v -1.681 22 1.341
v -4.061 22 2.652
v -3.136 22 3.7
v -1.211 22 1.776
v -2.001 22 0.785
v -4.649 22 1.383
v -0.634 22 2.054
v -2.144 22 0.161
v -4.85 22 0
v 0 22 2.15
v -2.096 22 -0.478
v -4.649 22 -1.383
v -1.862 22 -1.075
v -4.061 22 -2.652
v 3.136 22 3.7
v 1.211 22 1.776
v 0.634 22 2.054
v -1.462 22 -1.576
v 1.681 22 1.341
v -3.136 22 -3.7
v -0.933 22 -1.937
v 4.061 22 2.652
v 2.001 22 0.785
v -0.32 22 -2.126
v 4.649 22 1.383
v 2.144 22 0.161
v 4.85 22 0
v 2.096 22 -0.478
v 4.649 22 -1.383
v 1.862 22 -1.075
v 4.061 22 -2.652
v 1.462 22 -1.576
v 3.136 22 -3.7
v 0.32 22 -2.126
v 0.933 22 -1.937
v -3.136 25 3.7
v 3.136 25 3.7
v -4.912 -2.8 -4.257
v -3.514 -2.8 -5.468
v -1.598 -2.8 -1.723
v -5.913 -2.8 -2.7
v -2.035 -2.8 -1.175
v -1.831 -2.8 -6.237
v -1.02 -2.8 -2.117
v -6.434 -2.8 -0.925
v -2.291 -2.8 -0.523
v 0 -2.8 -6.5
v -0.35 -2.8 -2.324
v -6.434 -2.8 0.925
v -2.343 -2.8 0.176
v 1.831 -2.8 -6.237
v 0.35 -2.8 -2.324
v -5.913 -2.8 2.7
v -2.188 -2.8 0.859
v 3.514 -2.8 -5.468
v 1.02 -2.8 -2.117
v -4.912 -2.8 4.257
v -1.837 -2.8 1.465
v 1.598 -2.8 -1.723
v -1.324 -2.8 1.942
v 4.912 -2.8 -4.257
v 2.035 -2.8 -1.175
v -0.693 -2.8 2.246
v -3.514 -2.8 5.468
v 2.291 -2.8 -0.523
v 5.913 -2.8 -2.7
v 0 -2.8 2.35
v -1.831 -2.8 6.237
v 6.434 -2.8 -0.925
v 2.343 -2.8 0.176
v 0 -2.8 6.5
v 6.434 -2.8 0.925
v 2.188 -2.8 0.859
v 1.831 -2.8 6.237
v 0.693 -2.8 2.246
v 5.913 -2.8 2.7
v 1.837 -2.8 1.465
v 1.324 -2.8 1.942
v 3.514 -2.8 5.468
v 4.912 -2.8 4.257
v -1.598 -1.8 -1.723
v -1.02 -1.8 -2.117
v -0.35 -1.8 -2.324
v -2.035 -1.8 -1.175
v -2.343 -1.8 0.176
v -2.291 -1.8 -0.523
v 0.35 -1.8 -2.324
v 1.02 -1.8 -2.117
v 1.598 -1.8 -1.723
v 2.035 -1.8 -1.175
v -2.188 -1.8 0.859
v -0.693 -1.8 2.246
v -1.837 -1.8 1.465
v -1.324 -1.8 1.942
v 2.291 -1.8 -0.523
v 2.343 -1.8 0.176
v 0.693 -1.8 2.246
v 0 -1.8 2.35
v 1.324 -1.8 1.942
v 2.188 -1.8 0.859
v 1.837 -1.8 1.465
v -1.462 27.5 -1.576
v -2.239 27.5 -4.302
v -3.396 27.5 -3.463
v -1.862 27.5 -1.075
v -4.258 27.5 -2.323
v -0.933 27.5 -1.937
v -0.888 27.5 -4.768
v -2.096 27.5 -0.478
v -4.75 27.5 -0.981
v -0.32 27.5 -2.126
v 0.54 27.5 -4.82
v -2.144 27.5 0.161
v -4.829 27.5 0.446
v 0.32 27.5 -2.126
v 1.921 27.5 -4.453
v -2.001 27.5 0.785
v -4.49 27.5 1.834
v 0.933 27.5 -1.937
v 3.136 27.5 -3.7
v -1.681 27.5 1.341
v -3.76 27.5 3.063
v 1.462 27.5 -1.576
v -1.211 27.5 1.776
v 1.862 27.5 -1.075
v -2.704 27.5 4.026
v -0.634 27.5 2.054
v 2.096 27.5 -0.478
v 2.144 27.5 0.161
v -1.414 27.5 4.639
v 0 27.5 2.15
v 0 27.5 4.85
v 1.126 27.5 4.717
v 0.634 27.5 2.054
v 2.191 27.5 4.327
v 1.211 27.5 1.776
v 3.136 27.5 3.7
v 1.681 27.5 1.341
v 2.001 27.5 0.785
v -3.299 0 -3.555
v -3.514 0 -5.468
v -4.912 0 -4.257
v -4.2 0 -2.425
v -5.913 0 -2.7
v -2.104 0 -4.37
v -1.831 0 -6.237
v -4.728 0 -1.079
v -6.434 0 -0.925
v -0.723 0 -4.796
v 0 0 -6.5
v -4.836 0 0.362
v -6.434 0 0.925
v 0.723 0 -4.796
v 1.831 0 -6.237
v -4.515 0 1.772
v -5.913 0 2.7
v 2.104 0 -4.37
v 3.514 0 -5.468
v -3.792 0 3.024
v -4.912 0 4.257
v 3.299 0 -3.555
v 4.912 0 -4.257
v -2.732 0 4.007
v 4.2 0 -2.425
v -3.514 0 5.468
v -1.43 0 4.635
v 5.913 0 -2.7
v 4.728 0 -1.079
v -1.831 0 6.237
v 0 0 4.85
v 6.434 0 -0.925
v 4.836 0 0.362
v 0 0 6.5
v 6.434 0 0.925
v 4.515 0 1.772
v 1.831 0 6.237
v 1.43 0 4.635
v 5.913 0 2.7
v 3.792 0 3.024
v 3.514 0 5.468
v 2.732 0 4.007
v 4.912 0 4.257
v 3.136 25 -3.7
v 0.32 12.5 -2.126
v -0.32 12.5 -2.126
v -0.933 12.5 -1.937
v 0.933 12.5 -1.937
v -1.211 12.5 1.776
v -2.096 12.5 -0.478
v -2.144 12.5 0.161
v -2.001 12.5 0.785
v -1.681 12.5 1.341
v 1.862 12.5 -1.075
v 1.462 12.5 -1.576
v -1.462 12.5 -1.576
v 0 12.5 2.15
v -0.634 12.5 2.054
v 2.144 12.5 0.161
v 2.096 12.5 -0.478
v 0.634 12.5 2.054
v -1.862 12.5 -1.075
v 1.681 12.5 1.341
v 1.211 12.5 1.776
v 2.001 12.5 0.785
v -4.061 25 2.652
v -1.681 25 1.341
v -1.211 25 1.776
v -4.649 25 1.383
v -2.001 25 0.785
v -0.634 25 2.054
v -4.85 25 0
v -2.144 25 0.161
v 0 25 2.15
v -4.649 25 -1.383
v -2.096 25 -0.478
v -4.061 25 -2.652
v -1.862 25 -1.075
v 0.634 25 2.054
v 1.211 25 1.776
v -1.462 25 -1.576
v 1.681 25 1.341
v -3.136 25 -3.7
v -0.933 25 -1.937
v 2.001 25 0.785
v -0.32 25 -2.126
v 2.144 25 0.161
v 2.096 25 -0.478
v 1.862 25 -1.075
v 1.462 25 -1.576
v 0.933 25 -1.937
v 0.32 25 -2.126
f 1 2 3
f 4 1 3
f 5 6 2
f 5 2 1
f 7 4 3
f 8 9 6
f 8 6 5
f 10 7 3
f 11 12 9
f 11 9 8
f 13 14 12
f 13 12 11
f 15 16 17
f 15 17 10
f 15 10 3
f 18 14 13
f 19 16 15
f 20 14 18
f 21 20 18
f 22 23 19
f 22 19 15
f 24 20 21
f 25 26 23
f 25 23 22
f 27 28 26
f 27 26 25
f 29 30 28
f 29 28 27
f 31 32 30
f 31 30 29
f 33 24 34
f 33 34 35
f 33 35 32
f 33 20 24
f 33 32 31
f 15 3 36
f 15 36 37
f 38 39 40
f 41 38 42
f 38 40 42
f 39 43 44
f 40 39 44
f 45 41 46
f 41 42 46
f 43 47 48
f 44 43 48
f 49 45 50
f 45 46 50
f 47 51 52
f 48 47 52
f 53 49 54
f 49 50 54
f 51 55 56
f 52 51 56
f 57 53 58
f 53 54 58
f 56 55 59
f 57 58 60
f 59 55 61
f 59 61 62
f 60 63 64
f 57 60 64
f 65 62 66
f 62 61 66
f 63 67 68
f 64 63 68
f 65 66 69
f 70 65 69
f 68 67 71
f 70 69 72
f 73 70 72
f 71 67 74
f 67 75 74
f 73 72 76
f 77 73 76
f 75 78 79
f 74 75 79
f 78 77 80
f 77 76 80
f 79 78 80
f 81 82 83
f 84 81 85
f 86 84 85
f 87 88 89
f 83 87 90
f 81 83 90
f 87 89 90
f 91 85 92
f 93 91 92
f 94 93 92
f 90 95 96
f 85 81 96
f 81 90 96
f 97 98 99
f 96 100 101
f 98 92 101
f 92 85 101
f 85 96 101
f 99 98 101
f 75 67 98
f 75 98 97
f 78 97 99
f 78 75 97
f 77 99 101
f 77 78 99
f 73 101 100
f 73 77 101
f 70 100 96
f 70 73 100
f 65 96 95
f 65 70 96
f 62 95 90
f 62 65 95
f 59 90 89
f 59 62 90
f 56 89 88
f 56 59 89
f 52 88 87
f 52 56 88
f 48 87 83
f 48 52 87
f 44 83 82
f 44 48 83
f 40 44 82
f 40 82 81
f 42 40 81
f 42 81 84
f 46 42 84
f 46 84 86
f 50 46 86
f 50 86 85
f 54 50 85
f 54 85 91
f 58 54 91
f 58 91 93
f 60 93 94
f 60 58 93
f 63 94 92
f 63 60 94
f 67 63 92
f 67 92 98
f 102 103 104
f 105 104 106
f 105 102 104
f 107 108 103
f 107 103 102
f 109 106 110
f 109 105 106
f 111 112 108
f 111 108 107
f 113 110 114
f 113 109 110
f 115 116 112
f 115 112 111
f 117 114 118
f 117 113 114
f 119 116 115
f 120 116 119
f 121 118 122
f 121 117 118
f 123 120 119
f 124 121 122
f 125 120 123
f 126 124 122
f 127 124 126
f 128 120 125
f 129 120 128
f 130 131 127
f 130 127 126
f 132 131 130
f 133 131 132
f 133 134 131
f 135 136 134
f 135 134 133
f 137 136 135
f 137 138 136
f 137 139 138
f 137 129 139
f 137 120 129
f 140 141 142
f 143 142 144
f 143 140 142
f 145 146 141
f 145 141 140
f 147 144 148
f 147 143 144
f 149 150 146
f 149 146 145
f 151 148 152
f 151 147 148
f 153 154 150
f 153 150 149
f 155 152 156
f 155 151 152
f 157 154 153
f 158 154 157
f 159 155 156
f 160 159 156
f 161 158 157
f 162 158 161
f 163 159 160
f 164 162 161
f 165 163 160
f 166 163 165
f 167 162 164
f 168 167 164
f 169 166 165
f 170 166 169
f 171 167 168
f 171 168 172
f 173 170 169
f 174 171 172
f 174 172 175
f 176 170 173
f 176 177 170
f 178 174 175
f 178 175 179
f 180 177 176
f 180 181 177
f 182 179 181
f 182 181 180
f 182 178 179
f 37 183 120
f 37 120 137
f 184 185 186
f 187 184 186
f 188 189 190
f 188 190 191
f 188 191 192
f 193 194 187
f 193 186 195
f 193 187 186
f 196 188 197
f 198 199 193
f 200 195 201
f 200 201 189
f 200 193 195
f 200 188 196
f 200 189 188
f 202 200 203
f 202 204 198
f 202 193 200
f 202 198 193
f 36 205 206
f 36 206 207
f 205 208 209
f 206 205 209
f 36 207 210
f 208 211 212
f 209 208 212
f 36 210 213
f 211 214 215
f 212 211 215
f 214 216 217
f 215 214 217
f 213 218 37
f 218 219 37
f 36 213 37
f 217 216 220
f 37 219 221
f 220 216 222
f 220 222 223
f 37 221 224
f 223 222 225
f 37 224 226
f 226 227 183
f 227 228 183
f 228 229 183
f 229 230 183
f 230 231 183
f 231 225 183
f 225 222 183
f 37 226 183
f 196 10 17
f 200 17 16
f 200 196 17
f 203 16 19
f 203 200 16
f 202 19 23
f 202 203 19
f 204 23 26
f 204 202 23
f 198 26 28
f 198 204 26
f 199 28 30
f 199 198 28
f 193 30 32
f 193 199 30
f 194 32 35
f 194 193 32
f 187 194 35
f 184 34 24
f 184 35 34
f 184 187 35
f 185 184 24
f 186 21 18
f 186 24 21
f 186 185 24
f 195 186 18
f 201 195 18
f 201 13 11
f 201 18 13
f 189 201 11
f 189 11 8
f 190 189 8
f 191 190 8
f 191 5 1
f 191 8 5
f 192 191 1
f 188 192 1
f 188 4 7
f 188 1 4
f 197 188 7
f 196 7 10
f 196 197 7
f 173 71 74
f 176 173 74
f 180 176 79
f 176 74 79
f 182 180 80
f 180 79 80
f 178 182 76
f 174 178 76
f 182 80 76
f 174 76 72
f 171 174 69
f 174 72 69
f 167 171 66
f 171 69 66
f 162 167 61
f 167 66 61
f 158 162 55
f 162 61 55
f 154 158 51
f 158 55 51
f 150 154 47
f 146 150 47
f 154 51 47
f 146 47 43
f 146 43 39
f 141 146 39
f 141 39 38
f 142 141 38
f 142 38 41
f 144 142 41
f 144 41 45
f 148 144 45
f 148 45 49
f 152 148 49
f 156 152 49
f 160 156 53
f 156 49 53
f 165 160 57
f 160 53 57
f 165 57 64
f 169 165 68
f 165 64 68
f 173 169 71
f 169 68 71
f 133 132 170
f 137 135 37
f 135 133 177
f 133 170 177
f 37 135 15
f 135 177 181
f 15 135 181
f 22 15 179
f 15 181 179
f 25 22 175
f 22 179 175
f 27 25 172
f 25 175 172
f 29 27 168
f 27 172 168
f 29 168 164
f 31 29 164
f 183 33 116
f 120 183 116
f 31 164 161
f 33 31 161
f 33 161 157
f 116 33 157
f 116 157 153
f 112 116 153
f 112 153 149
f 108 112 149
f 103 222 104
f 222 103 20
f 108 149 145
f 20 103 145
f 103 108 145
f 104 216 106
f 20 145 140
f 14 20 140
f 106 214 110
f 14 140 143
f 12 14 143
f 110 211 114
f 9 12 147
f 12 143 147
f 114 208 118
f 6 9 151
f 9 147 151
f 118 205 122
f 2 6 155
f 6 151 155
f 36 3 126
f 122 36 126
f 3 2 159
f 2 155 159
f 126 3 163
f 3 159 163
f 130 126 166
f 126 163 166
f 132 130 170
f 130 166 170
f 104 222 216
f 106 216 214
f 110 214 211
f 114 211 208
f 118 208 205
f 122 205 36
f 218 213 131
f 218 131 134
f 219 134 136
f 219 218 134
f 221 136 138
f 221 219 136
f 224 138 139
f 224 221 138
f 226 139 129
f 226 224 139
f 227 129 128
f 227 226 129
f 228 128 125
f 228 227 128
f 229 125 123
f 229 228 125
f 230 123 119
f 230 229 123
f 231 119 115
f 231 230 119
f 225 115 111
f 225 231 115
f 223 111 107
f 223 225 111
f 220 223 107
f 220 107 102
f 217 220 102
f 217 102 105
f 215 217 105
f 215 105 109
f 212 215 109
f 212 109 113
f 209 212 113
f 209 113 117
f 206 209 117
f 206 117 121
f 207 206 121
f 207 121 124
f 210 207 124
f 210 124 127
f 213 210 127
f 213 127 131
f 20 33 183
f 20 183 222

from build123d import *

# Parameters (mm, degrees)
SKETCH1_R              = 4.85
SKETCH1_R_2            = 3
SKETCH1_R_3            = 2.15
BOSS_EXTRUDE1_DEPTH    = 27.5
BOSS_EXTRUDE2_START    = -2.8
SKETCH1_3_R            = 6.5
SKETCH1_3_R_2          = 4.85
SKETCH1_3_R_3          = 3
SKETCH1_3_R_4          = 2.15
BOSS_EXTRUDE2_DEPTH    = 2.8
CUT_EXTRUDE1_START     = 22
CUT_EXTRUDE1_OUTLINE_R = 2.15
CUT_EXTRUDE1_DEPTH     = 3
CUT_EXTRUDE2_START     = 12.5
SKETCH2_3_R            = 2.15
CUT_EXTRUDE2_DEPTH     = 15
CUT_EXTRUDE3_START     = 22
CUT_EXTRUDE3_DEPTH     = 15
CUT_EXTRUDE4_START     = -2.8
SKETCH3_R              = 2.35
CUT_EXTRUDE4_DEPTH     = 1


# Read off the part's stored shape, not the designer's step: Cut-Extrude1
with BuildPart() as part:
    # Sketch1 → Boss-Extrude1 (new body)
    # profile 1 of 3: a face of its own
    with BuildSketch(Plane(origin=(0, 0, 0), x_dir=(1, 0, 0), z_dir=(0, 1, 0))):
        with Locations(Location((0, 0, 0), (0, 0, 270))):
            Circle(SKETCH1_R)
        Circle(SKETCH1_R_2, mode=Mode.SUBTRACT)
    # profile 2 of 3: a face of its own
    with BuildSketch(Plane(origin=(0, 0, 0), x_dir=(1, 0, 0), z_dir=(0, 1, 0))):
        Circle(SKETCH1_R_2)
        Circle(SKETCH1_R_3, mode=Mode.SUBTRACT)
    # profile 3 of 3: a face of its own
    with BuildSketch(Plane(origin=(0, 0, 0), x_dir=(1, 0, 0), z_dir=(0, 1, 0))):
        Circle(SKETCH1_R_3)
    extrude(amount=BOSS_EXTRUDE1_DEPTH)

    # Sketch1<3> → Boss-Extrude2 (add)
    # profile 1 of 4: a face of its own
    with BuildSketch(Plane(origin=(0, 0, 0), x_dir=(1, 0, 0), z_dir=(0, 1, 0)).offset(BOSS_EXTRUDE2_START)):
        with Locations(Location((0, 0, 0), (0, 0, 270))):
            Circle(SKETCH1_3_R)
        with Locations(Location((0, 0, 0), (0, 0, 270))):
            Circle(SKETCH1_3_R_2, mode=Mode.SUBTRACT)
    # profile 2 of 4: a face of its own
    with BuildSketch(Plane(origin=(0, 0, 0), x_dir=(1, 0, 0), z_dir=(0, 1, 0)).offset(BOSS_EXTRUDE2_START)):
        with Locations(Location((0, 0, 0), (0, 0, 270))):
            Circle(SKETCH1_3_R_2)
        Circle(SKETCH1_3_R_3, mode=Mode.SUBTRACT)
    # profile 3 of 4: a face of its own
    with BuildSketch(Plane(origin=(0, 0, 0), x_dir=(1, 0, 0), z_dir=(0, 1, 0)).offset(BOSS_EXTRUDE2_START)):
        Circle(SKETCH1_3_R_3)
        Circle(SKETCH1_3_R_4, mode=Mode.SUBTRACT)
    # profile 4 of 4: a face of its own
    with BuildSketch(Plane(origin=(0, 0, 0), x_dir=(1, 0, 0), z_dir=(0, 1, 0)).offset(BOSS_EXTRUDE2_START)):
        Circle(SKETCH1_3_R_4)
    extrude(amount=BOSS_EXTRUDE2_DEPTH)

    # Cut-Extrude1 outline → Cut-Extrude1 (cut)
    with BuildSketch(Plane(origin=(0, 0, 0), x_dir=(1, 0, 0), z_dir=(0, 1, 0)).offset(CUT_EXTRUDE1_START)):
        with BuildLine():
            ThreePointArc((-3.135681744, 3.7), (-4.85, 0), (-3.135681744, -3.7))
            Line((-3.135681744, -3.7), (3.135681744, -3.7))
            ThreePointArc((3.135681744, -3.7), (4.85, 0), (3.135681744, 3.7))
            Line((3.135681744, 3.7), (-3.135681744, 3.7))
        make_face()
        Circle(CUT_EXTRUDE1_OUTLINE_R, mode=Mode.SUBTRACT)
    extrude(amount=CUT_EXTRUDE1_DEPTH, mode=Mode.SUBTRACT)

    # Sketch2<3> → Cut-Extrude2 (cut)
    with BuildSketch(Plane(origin=(0, 0, 0), x_dir=(1, 0, 0), z_dir=(0, 1, 0)).offset(CUT_EXTRUDE2_START)):
        with Locations(Location((0, 0, 0), (0, 0, 270))):
            Circle(SKETCH2_3_R)
    extrude(amount=CUT_EXTRUDE2_DEPTH, mode=Mode.SUBTRACT)

    # Sketch2<4> → Cut-Extrude3 (cut)
    with BuildSketch(Plane(origin=(0, 0, 0), x_dir=(1, 0, 0), z_dir=(0, 1, 0)).offset(CUT_EXTRUDE3_START)):
        Polygon((4.272391992, 0), (3.135681744, 1.968839903), (3.135681744, -1.968839903), align=None)
        with BuildLine():
            ThreePointArc((4.85, 0), (4.400599758, 2.038926622), (3.135681744, 3.7))
            Line((3.135681744, 3.7), (3.135681744, 1.968839903))
            Line((3.135681744, 1.968839903), (4.272391992, 0))
            Line((4.272391992, 0), (3.135681744, -1.968839903))
            Line((3.135681744, -1.968839903), (3.135681744, -3.7))
            ThreePointArc((3.135681744, -3.7), (4.400599758, -2.038926622), (4.85, 0))
        make_face()
    extrude(amount=CUT_EXTRUDE3_DEPTH, mode=Mode.SUBTRACT)

    # Sketch3 → Cut-Extrude4 (cut)
    with BuildSketch(Plane(origin=(0, 0, 0), x_dir=(1, 0, 0), z_dir=(0, 1, 0)).offset(CUT_EXTRUDE4_START)):
        with Locations(Location((0, 0, 0), (0, 0, 270))):
            Circle(SKETCH3_R)
    extrude(amount=CUT_EXTRUDE4_DEPTH, mode=Mode.SUBTRACT)


solid = part.part
